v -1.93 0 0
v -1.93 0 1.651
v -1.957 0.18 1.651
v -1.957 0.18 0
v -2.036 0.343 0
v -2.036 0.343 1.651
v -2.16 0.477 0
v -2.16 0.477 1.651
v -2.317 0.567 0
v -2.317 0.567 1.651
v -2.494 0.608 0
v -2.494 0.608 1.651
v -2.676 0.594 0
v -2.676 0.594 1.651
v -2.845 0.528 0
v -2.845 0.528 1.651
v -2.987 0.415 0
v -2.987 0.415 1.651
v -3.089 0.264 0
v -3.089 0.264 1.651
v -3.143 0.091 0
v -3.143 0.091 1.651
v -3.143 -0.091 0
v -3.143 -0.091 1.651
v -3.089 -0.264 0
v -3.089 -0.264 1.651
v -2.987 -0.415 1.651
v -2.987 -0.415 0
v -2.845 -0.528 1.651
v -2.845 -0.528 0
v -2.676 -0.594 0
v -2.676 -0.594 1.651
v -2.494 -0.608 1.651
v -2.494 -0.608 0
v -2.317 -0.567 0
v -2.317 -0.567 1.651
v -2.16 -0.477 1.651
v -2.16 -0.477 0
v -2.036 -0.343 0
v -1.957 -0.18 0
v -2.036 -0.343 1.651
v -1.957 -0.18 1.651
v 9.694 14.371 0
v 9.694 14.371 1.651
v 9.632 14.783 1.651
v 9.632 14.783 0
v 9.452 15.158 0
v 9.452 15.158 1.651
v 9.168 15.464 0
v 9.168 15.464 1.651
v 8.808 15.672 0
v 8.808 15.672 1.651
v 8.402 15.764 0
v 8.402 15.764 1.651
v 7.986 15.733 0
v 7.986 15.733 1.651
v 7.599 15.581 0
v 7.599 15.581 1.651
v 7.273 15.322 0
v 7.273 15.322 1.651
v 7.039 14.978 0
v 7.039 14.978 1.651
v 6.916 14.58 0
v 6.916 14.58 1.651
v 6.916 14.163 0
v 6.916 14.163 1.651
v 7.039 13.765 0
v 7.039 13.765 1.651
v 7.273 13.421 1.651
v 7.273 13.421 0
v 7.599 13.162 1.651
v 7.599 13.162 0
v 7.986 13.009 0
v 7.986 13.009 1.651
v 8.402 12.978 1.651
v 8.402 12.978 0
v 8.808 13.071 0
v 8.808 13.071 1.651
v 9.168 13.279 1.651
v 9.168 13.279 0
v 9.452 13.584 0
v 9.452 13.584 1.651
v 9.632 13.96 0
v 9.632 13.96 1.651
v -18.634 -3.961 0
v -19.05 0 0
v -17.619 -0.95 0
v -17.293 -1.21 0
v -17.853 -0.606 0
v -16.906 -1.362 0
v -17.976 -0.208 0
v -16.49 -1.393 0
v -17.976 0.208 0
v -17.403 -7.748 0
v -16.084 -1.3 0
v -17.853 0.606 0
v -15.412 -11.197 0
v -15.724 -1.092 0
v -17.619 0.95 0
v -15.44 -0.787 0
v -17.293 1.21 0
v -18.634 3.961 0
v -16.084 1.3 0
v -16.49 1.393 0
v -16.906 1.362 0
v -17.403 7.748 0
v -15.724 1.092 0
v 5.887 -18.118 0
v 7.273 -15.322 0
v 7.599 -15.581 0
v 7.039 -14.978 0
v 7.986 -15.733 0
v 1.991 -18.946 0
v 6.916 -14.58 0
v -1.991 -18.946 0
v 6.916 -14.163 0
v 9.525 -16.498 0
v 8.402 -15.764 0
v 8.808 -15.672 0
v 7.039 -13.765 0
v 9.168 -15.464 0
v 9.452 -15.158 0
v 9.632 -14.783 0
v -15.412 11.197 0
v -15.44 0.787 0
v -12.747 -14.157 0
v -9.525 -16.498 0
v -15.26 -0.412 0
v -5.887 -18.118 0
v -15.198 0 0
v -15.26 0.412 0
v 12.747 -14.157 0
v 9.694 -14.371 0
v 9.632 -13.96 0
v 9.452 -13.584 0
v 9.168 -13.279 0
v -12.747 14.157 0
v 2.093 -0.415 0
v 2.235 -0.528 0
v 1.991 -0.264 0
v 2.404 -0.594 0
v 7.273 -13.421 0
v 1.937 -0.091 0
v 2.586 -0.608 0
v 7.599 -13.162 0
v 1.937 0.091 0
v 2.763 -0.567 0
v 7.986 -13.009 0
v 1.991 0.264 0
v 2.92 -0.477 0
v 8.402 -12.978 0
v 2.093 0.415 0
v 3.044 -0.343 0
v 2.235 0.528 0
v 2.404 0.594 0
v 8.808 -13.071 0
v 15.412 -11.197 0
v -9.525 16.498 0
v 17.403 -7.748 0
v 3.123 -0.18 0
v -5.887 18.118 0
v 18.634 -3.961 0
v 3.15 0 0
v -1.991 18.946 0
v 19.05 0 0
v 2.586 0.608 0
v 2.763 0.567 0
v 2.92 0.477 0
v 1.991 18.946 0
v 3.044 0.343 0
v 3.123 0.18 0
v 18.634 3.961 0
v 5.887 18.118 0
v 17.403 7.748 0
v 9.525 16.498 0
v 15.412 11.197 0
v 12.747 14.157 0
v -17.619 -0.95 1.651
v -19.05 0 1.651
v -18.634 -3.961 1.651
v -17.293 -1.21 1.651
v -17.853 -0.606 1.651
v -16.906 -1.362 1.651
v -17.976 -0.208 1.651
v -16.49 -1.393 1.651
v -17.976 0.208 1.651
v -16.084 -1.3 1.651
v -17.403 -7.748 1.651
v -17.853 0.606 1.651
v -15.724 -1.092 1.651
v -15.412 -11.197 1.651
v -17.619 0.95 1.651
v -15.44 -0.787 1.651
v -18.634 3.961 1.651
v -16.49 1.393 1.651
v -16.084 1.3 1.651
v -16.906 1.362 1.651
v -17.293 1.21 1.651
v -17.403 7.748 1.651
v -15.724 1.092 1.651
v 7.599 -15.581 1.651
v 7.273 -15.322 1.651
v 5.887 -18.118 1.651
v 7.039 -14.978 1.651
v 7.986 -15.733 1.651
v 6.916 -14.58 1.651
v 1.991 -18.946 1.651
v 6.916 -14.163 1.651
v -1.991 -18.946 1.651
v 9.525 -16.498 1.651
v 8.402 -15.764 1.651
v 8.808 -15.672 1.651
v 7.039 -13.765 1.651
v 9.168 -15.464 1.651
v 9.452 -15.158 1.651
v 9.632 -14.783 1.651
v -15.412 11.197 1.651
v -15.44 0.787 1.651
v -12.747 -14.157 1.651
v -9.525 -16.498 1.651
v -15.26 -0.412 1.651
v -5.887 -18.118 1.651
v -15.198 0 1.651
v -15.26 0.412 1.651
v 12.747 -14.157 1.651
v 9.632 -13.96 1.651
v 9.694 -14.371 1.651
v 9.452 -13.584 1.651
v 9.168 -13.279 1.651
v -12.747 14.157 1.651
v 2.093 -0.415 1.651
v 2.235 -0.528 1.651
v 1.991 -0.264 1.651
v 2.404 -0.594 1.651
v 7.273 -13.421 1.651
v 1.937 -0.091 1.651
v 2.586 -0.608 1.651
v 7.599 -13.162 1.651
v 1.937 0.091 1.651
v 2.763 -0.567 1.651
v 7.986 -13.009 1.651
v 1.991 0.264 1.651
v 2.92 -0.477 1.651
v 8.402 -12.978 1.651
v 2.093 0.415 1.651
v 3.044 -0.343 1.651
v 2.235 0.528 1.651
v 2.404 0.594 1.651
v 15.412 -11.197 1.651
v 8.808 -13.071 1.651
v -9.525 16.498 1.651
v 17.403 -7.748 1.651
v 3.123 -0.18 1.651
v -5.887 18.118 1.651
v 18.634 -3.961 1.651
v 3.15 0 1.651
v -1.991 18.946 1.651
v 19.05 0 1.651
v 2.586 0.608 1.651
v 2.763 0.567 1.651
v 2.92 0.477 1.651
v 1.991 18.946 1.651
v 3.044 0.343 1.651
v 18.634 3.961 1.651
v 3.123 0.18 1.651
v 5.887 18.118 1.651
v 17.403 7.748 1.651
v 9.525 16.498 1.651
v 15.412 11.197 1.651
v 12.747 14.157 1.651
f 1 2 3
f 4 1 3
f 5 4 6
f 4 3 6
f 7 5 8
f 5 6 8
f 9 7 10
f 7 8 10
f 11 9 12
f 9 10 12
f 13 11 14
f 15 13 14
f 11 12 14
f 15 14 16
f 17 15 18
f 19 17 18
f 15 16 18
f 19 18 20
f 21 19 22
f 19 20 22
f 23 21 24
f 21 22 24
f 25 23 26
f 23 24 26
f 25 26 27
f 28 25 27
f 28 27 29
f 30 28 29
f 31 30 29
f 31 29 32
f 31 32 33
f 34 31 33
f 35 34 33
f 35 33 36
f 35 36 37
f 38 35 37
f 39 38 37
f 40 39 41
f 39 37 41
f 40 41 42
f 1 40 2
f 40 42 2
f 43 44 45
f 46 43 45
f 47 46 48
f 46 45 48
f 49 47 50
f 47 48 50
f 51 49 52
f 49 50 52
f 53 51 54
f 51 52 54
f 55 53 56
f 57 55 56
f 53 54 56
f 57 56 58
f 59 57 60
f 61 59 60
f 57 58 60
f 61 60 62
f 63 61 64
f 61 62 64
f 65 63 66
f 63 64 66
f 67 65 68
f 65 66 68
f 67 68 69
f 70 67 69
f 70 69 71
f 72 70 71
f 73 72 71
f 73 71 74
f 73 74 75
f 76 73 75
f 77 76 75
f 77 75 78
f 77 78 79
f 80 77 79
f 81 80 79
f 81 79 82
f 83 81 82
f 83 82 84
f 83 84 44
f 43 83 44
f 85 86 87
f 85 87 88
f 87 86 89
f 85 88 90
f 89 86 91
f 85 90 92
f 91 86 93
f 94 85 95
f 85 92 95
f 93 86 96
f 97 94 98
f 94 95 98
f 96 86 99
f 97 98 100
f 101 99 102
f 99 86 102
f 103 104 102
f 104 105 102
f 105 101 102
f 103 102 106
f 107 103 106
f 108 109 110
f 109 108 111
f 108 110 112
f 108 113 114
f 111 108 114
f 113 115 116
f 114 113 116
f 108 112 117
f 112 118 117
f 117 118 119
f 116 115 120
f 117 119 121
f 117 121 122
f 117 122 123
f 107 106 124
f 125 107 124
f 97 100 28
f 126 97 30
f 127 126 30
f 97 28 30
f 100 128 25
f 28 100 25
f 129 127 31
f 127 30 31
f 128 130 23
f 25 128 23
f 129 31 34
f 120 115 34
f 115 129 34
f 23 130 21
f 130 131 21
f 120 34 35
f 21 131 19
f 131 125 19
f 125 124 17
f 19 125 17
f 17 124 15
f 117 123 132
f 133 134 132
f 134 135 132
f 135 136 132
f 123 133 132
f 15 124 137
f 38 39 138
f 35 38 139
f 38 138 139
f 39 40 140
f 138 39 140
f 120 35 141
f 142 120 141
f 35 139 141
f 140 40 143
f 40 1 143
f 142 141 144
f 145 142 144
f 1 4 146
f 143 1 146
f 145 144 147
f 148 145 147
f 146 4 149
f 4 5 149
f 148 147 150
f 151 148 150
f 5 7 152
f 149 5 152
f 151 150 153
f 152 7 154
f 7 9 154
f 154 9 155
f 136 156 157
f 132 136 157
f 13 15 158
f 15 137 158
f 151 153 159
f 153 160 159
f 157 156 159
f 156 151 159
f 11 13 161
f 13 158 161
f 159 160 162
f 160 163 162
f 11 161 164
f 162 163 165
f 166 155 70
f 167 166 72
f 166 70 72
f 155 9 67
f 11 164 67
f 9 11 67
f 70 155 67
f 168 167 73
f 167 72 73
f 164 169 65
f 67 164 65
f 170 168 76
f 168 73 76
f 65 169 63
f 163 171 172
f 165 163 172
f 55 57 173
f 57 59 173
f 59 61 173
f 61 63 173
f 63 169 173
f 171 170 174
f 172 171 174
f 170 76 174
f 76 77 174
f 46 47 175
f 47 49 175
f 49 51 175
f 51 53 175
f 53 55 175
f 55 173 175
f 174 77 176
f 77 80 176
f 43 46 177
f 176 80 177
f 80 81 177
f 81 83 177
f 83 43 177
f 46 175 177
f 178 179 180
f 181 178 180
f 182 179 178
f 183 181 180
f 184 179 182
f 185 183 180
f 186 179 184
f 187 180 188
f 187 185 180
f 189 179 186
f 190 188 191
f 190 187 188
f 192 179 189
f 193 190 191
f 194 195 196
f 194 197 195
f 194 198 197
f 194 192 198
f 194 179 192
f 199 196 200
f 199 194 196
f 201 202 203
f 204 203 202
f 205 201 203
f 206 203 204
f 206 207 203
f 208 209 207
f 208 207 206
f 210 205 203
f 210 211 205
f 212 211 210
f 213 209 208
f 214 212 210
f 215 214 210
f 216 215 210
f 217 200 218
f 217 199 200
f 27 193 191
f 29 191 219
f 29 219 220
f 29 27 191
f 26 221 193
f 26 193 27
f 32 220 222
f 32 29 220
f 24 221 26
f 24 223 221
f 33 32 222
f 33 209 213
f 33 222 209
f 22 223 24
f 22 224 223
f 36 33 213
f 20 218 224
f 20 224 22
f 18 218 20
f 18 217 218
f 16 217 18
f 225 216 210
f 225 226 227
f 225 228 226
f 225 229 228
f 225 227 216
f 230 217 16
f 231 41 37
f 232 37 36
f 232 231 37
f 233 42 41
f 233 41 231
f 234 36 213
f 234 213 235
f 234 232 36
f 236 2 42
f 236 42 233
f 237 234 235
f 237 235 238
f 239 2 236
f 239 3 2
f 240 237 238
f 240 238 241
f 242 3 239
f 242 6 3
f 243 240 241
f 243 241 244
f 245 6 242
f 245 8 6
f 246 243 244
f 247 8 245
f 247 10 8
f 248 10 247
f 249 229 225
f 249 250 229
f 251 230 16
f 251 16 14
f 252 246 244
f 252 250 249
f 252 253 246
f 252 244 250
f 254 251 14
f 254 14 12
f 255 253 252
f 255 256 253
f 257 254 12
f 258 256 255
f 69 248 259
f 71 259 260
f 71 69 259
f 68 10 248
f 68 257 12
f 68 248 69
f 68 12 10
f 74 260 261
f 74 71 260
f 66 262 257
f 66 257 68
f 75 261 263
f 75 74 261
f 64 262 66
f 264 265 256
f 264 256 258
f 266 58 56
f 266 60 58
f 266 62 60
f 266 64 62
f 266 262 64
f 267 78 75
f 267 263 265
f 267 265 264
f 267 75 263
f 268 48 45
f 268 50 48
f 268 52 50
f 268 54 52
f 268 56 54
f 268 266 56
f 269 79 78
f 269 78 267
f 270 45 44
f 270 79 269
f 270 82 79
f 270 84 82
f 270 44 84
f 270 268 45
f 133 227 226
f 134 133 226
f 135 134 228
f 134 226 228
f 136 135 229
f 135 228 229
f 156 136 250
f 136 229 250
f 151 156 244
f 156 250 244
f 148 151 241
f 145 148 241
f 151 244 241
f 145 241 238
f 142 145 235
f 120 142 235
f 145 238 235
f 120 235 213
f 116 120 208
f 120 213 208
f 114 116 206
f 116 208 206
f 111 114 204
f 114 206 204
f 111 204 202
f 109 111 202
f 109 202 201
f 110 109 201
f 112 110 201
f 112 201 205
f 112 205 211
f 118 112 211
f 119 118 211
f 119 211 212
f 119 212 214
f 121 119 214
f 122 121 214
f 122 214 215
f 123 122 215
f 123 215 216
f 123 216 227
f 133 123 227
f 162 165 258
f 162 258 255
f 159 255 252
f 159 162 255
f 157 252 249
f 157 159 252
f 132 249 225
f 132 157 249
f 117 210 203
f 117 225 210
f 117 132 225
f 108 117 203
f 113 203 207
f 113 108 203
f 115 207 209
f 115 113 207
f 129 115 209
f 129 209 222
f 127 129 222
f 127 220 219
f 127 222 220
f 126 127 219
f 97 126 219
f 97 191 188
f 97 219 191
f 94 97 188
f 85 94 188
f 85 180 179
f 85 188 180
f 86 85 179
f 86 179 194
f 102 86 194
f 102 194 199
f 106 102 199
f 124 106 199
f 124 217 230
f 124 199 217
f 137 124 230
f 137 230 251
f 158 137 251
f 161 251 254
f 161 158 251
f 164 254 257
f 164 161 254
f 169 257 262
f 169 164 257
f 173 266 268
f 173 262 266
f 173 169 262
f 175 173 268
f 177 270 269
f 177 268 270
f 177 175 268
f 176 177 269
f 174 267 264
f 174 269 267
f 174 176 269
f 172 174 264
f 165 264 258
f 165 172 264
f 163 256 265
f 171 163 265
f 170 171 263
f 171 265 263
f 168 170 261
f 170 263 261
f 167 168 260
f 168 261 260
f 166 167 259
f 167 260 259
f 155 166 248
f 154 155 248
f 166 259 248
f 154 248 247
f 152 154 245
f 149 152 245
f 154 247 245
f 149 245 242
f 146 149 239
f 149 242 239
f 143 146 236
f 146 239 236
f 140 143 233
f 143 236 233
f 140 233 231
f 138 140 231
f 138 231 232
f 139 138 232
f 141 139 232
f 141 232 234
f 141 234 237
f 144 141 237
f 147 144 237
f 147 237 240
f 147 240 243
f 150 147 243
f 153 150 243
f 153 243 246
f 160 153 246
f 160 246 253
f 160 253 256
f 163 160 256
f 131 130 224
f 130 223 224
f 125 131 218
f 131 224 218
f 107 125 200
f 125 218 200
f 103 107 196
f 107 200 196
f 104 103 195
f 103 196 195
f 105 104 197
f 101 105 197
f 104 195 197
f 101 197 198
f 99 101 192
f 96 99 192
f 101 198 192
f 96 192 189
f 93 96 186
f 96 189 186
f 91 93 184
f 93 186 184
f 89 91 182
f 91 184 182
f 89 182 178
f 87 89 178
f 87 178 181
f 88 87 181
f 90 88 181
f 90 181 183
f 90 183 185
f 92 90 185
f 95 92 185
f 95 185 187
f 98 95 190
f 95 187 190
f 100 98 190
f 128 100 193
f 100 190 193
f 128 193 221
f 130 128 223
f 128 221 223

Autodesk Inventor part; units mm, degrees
ref_plane "YZ Plane" through (0, 0, 0) normal (1, 0, 0) x (0, 1, 0)
ref_plane "XZ Plane" through (0, 0, 0) normal (0, 1, 0) x (-1, 0, 0)
ref_plane "XY Plane" through (0, 0, 0) normal (0, 0, 1) x (1, 0, 0)
sketch "Sketch1" plane through (0, 0, 0) normal (0, 0, 1) x (1, 0, 0)
  circle A0 centre (0, 0) radius 19.05
  dimension "d0" = 38.1
extrude "Extrusion1" add sketch "Sketch1" along normal blind 1.651
sketch "Sketch2" plane through (0, 0, 1.651) normal (0, 0, 1) x (1, 0, 0)
  circle A0 centre (0, 0) radius 19.05 projected
  line L0 (-19.05, 19.05) -> (19.05, 19.05) construction
  line L1 (19.05, 19.05) -> (19.05, -19.05) construction
  line L2 (19.05, -19.05) -> (-19.05, -19.05) construction
  line L3 (-19.05, -19.05) -> (-19.05, 19.05) construction
  point P0 (0, 19.05)
  point P1 (-19.05, 0)
  point P2 (0, 19.05)
  point P3 (-19.05, 0)
decal "Decal1"
sketch "Sketch3" plane through (0, 0, 1.651) normal (0, 0, 1) x (1, 0, 0)
  circle A0 centre (-16.5947, 0) radius 1.397
  line L0 (19.05, -19.05) -> (-19.05, -19.05) construction
  line L1 (-19.05, -19.05) -> (-19.05, 19.05) construction
  line L2 (-19.05, 19.05) -> (19.05, 19.05) construction
  line L3 (19.05, 19.05) -> (19.05, -19.05) construction
  line L4 (19.05, -19.05) -> (-19.05, 19.05) construction
  line L5 (-19.05, -19.05) -> (19.05, 19.05) construction
  circle A1 centre (8.2973, 14.3714) radius 1.397
  circle A2 centre (8.2973, -14.3714) radius 1.397
  line L6 (-16.5947, 0) -> (8.2973, 14.3714) construction
  line L7 (8.2973, 14.3714) -> (8.2973, -14.3714) construction
  line L8 (8.2973, -14.3714) -> (-16.5947, 0) construction
  circle A3 centre (-2.54, 0) radius 0.6096
  circle A4 centre (2.54, 0) radius 0.6096
  point P0 (0, 0)
  point P1 (0, 0)
  dimension "d8" = 2.794
  dimension "d9" = 38.1
  dimension "d11" = 19.05
  dimension "d13" = 1.2192
  dimension "d14" = 5.08
  dimension "d15" = 2.54
  dimension "d25" = 24.892
  dimension "d26" = 2.4553
extrude "Extrusion2" cut sketch "Sketch3" against normal through all
sketch "Sketch5" plane through (0, 0, 0) normal (0, 0, -1) x (-1, 0, 0)
  circle A0 centre (0, 0) radius 19.05 projected
  line L0 (-19.05, 19.05) -> (19.05, 19.05) construction
  line L1 (19.05, 19.05) -> (19.05, -19.05) construction
  line L2 (19.05, -19.05) -> (-19.05, -19.05) construction
  line L3 (-19.05, -19.05) -> (-19.05, 19.05) construction
  point P0 (-19.05, 0)
  point P1 (0, 19.05)
  point P2 (0, 19.05)
  point P3 (-19.05, 0)
decal "Decal3"
properties part number "Filament Board"
